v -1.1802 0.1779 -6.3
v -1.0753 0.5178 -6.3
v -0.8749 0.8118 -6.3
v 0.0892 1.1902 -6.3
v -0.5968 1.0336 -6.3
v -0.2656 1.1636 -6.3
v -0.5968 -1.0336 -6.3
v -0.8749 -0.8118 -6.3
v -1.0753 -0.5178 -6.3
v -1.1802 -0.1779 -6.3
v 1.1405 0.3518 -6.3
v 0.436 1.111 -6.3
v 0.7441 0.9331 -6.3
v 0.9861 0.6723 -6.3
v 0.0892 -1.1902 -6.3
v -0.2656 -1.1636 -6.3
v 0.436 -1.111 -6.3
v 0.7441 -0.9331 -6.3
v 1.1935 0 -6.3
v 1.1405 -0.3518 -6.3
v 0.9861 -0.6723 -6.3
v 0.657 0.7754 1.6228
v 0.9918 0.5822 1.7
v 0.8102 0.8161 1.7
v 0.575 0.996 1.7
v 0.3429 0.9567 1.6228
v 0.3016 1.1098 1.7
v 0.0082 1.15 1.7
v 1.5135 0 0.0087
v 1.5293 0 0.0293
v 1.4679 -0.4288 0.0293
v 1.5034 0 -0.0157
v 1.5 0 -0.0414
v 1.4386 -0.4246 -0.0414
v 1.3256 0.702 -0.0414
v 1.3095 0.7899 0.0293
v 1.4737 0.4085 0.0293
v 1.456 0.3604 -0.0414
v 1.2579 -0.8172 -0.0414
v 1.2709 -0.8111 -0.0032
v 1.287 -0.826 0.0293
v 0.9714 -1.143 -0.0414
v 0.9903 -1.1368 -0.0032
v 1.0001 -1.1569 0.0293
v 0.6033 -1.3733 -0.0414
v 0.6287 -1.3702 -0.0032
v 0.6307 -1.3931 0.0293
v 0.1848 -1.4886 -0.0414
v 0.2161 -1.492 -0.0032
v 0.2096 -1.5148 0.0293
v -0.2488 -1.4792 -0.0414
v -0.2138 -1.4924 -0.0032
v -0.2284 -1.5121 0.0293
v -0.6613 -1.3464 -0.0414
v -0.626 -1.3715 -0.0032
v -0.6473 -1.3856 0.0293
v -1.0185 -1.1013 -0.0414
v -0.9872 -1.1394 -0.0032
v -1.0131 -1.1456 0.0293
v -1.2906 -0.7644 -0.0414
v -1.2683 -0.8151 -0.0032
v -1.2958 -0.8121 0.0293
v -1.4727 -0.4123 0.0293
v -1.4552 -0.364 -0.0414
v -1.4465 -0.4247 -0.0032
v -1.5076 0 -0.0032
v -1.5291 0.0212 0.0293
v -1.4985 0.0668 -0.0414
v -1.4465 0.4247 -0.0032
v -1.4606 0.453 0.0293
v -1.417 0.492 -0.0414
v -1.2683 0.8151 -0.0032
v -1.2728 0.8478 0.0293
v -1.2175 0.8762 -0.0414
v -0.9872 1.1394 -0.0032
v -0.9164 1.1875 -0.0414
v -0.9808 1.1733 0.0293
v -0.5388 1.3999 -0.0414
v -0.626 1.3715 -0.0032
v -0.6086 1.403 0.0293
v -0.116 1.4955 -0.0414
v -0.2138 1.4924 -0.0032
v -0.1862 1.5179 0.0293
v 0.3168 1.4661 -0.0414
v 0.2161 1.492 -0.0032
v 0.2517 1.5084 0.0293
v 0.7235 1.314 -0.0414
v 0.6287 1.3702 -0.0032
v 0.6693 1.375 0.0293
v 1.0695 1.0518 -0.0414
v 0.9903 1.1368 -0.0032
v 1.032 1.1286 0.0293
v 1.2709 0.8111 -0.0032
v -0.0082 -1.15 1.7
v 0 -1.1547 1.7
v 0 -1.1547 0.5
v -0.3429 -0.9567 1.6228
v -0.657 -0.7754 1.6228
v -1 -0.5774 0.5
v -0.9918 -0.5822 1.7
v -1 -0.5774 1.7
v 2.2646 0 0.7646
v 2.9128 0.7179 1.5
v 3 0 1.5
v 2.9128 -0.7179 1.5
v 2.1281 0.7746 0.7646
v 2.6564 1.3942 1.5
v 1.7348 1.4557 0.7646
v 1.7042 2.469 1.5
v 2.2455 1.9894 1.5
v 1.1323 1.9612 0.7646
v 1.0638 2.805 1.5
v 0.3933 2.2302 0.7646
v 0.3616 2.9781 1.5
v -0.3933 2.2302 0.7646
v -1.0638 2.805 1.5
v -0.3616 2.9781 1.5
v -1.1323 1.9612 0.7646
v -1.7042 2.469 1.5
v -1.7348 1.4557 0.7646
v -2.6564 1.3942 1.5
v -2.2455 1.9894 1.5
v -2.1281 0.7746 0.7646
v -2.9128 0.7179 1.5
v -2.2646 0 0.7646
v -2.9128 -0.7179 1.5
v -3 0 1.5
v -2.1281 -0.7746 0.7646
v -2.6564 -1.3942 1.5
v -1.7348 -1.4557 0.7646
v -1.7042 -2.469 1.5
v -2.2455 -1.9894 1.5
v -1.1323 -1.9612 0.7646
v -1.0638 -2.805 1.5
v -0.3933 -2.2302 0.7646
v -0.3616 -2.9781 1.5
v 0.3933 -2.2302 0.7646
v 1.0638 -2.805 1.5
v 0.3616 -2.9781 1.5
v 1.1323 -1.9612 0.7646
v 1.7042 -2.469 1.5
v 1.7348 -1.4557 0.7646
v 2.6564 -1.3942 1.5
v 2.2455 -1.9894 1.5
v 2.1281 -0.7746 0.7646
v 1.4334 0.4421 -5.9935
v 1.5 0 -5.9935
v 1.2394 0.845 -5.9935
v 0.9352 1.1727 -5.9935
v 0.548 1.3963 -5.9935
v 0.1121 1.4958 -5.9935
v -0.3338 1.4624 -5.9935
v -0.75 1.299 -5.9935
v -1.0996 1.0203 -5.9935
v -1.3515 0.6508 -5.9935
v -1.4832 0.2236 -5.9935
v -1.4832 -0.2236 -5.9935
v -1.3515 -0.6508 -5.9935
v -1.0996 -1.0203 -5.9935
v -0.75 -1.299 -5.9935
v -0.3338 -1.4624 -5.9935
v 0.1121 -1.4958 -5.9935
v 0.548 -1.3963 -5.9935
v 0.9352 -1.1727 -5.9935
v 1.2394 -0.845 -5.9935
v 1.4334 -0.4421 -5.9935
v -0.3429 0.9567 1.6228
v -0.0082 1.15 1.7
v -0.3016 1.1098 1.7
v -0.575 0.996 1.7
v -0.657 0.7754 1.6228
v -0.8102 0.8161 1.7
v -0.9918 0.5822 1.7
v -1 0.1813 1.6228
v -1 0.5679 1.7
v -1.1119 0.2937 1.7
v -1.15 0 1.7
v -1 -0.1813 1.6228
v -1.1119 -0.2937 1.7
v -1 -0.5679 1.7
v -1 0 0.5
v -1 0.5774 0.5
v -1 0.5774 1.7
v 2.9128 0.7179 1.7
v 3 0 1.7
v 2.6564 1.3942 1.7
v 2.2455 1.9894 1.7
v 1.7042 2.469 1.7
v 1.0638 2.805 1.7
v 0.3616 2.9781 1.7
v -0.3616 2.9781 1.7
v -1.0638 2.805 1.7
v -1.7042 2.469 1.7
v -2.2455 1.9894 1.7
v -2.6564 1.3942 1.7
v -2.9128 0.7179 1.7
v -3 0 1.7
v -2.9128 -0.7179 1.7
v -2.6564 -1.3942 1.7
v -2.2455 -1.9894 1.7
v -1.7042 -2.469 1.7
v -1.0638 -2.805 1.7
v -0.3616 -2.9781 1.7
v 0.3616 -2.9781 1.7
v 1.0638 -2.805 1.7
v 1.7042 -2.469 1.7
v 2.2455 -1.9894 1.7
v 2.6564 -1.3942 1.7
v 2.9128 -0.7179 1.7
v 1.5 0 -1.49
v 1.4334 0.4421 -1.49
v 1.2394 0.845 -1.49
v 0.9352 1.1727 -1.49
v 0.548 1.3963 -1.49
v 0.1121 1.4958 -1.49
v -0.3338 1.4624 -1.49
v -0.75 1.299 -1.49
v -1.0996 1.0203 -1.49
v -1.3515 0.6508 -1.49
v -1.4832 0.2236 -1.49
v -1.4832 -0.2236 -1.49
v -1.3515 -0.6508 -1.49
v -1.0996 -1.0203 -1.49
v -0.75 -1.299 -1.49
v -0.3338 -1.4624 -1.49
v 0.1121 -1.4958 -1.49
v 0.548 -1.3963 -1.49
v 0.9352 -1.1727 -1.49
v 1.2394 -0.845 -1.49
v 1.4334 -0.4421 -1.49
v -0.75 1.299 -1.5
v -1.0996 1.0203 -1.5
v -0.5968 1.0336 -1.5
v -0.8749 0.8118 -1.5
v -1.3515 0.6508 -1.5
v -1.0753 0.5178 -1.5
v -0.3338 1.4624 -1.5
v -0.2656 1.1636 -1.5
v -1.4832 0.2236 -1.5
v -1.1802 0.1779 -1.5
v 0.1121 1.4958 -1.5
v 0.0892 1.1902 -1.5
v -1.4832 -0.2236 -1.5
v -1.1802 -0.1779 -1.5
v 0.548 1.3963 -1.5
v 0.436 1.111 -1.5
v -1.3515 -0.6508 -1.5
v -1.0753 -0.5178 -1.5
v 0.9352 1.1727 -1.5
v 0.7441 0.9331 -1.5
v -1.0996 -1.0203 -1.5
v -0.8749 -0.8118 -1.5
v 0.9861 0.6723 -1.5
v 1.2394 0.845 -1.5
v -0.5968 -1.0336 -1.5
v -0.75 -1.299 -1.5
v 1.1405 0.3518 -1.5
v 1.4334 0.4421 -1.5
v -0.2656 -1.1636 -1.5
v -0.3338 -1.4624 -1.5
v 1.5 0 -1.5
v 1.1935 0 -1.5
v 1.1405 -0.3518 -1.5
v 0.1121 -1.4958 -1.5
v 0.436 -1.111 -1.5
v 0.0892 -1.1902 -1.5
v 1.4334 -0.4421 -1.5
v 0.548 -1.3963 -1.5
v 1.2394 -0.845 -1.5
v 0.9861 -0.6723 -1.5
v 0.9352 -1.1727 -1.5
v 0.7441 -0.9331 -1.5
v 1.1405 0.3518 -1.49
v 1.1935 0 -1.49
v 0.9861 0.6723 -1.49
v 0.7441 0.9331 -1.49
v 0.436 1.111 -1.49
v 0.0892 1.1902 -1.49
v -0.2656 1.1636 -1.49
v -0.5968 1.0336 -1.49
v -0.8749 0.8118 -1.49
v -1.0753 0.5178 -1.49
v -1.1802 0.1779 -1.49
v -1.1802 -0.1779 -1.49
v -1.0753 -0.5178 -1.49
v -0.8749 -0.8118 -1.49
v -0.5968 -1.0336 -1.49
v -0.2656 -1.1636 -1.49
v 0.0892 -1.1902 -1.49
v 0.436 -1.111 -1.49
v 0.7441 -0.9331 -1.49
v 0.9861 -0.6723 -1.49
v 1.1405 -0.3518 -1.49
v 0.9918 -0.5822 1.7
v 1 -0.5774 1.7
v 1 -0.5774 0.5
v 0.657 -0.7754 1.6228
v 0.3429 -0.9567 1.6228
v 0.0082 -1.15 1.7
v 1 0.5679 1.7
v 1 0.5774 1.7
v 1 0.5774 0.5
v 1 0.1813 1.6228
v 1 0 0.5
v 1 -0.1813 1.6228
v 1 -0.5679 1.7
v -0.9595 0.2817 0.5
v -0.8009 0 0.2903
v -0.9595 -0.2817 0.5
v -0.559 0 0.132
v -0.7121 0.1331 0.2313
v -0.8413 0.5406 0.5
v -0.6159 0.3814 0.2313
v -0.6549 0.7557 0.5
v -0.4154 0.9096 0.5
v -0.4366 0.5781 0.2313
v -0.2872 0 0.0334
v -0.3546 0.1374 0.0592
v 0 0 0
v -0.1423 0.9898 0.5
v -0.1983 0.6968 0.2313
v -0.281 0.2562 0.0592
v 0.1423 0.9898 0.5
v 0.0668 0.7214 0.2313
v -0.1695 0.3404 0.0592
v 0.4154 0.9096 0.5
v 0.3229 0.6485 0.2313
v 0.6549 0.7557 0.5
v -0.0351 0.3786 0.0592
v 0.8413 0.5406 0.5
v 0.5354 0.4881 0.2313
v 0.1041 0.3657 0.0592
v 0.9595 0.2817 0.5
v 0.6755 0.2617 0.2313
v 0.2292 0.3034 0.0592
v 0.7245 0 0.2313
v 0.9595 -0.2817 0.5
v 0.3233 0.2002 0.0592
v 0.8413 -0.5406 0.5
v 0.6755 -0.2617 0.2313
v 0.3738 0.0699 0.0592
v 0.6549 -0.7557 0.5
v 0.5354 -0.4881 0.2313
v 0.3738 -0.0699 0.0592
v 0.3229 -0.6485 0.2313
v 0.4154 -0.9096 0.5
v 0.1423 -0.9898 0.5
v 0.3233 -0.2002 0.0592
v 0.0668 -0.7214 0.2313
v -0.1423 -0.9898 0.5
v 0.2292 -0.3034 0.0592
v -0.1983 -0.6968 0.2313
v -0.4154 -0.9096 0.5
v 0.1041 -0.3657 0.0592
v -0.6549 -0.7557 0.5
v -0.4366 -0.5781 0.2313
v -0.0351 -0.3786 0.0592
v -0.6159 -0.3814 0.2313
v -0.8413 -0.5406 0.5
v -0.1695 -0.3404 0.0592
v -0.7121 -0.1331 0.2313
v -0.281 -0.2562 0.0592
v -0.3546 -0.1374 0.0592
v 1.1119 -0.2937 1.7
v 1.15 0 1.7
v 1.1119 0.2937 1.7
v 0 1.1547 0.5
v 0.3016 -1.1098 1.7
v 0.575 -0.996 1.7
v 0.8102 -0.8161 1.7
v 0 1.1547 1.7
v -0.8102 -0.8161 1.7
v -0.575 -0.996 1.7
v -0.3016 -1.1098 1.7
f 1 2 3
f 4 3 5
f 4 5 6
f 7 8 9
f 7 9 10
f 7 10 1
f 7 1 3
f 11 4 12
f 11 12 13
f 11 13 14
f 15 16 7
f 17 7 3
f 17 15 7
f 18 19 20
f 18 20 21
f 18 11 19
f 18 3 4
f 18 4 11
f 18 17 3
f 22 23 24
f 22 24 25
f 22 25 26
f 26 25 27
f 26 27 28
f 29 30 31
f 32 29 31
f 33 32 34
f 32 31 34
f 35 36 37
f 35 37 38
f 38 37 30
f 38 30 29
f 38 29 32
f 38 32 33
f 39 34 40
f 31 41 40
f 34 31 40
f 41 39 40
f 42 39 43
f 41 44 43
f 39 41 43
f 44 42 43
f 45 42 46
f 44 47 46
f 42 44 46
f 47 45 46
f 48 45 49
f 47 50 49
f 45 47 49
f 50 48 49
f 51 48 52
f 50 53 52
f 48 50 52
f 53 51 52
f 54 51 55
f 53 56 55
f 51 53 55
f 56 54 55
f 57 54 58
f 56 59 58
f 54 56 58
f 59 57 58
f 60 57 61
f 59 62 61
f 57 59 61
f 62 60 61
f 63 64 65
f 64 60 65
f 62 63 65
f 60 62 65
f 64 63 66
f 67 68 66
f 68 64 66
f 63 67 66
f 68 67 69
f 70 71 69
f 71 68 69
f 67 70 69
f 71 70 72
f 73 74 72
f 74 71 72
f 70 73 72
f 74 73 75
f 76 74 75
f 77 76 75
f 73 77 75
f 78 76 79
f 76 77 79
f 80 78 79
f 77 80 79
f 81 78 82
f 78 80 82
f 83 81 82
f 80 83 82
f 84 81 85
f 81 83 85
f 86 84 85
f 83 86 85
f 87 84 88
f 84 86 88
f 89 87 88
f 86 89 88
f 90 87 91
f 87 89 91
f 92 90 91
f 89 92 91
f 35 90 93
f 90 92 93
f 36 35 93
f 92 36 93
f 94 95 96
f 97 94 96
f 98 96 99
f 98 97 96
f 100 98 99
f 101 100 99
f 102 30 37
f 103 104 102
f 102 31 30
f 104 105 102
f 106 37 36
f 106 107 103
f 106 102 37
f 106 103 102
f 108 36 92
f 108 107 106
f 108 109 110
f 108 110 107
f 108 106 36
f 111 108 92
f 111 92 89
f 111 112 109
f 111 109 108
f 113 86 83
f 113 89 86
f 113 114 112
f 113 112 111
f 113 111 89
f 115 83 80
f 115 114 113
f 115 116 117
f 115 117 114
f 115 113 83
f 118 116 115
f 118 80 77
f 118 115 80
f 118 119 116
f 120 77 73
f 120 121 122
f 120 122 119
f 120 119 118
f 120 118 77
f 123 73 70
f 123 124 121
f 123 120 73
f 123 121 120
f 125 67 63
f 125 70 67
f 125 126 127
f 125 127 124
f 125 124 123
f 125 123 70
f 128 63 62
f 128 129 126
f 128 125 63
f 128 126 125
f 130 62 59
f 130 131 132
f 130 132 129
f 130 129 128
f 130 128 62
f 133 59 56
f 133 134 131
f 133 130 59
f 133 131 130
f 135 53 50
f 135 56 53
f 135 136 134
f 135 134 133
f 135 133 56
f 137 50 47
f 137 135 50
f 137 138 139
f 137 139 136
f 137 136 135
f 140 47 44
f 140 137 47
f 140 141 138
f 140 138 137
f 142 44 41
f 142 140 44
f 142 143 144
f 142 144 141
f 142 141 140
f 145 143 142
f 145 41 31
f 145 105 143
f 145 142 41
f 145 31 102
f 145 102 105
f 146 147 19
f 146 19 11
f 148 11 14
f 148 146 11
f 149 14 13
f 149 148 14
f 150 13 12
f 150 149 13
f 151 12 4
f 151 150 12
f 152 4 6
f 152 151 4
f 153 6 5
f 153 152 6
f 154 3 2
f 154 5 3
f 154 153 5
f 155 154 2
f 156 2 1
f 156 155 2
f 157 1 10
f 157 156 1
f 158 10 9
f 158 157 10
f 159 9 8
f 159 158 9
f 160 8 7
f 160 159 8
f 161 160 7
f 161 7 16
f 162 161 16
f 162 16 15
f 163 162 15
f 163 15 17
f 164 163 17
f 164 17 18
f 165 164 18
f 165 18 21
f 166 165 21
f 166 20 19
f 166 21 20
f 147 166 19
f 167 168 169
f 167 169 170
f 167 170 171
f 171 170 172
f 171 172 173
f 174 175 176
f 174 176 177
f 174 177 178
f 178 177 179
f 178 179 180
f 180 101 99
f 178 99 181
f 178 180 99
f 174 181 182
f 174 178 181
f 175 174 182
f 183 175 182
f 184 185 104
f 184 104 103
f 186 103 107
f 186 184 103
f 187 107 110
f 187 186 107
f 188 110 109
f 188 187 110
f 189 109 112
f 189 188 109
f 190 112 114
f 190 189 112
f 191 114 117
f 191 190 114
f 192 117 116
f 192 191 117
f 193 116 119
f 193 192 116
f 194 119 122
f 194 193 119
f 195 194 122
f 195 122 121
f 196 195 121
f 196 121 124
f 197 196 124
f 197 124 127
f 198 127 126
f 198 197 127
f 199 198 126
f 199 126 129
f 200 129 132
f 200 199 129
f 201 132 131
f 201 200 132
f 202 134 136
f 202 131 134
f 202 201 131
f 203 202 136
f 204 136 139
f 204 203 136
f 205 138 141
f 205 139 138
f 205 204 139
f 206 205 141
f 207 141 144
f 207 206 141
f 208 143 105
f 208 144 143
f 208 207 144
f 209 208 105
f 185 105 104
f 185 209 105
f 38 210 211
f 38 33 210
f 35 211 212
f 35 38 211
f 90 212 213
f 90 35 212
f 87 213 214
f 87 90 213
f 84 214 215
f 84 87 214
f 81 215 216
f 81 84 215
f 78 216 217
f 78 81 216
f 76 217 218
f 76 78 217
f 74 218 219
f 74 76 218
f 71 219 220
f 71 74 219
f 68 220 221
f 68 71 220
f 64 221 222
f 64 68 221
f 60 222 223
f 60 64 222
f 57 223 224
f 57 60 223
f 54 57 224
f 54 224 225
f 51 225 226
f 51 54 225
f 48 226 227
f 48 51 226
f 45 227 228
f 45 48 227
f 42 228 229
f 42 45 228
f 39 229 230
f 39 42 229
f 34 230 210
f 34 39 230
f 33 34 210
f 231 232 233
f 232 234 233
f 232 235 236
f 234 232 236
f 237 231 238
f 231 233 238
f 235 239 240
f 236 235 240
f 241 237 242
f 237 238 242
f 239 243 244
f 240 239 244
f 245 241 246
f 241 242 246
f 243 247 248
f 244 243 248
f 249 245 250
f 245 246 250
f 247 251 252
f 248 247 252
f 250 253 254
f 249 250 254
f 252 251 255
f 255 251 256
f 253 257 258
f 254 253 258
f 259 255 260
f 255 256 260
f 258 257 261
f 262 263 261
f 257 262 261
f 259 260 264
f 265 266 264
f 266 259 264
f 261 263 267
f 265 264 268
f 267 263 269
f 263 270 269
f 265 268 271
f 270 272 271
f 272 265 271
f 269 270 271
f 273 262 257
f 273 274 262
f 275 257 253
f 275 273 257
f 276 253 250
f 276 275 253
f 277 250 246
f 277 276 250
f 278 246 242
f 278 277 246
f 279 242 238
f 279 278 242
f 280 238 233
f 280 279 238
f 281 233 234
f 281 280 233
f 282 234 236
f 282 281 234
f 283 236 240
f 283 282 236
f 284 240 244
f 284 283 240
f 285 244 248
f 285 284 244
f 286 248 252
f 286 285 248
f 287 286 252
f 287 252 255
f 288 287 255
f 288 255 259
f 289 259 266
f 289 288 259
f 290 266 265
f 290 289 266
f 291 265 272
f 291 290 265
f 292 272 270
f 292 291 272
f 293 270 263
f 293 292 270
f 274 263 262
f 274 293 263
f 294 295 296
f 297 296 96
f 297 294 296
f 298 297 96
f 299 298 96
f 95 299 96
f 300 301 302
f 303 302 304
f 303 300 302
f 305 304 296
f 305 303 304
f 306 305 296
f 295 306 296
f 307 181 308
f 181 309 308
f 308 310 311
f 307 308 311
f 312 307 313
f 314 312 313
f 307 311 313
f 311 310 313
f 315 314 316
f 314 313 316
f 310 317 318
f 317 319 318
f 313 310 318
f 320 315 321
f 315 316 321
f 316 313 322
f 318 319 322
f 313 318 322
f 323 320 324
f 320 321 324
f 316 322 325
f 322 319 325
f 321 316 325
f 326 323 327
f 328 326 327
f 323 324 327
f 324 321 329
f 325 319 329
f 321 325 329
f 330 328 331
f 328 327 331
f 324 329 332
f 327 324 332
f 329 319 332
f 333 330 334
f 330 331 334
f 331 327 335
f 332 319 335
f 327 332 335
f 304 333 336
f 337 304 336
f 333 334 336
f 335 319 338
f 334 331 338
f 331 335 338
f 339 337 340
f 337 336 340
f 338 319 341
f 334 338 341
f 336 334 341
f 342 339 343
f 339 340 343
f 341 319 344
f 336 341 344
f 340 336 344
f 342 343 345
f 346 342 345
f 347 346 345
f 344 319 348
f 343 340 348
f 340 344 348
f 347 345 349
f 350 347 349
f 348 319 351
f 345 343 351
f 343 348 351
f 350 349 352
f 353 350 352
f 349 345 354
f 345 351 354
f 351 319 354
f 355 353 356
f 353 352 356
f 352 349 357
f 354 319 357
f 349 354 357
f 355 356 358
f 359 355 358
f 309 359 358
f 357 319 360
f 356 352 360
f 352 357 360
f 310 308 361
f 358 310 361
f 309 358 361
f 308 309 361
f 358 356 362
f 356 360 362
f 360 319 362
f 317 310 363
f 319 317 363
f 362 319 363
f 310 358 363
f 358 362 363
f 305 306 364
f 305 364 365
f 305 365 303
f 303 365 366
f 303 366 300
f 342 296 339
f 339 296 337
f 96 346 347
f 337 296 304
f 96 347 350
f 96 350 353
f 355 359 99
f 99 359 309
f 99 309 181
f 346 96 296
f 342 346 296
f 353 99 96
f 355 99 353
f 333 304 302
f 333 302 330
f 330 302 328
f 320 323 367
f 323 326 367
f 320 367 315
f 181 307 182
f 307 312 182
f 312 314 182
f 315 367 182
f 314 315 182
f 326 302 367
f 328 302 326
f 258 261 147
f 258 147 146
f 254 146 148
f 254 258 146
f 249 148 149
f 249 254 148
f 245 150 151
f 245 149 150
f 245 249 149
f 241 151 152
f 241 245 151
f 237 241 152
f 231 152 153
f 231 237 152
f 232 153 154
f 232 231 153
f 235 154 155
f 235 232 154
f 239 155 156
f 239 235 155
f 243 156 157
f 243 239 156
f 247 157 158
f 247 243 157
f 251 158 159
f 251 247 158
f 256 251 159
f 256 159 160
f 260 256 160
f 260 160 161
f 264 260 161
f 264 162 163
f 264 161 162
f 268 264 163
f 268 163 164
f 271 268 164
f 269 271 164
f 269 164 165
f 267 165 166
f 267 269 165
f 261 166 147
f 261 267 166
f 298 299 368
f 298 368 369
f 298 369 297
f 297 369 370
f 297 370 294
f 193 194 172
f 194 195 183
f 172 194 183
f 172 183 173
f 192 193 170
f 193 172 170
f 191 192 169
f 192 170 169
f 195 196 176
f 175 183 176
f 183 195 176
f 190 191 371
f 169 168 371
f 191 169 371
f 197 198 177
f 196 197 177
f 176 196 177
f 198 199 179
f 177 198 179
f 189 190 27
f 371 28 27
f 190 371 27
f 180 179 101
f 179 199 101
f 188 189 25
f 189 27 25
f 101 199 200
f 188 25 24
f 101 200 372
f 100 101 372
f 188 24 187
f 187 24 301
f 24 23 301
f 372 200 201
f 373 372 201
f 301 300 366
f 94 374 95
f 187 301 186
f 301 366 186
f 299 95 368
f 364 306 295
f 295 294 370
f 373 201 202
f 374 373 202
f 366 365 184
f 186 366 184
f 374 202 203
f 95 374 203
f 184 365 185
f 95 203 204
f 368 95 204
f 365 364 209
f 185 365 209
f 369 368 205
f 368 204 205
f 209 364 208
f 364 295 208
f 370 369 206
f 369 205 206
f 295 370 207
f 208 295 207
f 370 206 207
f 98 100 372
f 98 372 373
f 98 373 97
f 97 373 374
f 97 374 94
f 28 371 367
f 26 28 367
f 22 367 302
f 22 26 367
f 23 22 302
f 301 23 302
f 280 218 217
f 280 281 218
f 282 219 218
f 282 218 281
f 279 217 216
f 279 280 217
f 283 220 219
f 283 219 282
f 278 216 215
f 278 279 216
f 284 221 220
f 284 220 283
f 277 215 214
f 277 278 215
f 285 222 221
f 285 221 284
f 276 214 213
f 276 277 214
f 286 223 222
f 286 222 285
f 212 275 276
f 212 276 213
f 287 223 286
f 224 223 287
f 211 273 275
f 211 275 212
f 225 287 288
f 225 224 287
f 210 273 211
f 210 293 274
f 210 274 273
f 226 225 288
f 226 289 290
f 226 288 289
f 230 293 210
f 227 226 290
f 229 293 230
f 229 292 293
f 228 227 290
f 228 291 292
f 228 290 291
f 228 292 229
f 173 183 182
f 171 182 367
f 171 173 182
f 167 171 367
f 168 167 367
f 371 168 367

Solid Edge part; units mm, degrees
sketch "Sketch1" plane through (0, 0, 0) normal (0, -1, 0) x (1, 0, 0)
  line L0 (1.5, 0) -> (3, 1.5)
  line L1 (3, 1.5) -> (3, 1.7)
  line L2 (3, 1.7) -> (0, 1.7)
  line L3 (0, 1.7) -> (0, -6.3)
  line L4 (0, -6.3) -> (1.1935, -6.3)
  line L5 (1.1935, -6.3) -> (1.5, -5.9935)
  line L6 (1.5, -5.9935) -> (1.5, -1.5)
  line L7 (1.5, -1.5) -> (1.1935, -1.5)
  line L8 (1.1935, -1.5) -> (1.1935, -1.49)
  line L9 (1.1935, -1.49) -> (1.5, -1.49)
  line L10 (1.5, -1.49) -> (1.5, 0)
  dimension "D1" = 8
  dimension "D2" = 3
  dimension "D3" = 1.7
  dimension "D4" = 0.01
  dimension "D5" = 1.1935
  dimension "D6" = 3.2
  dimension "D7" = 0.2
revolve "RevolvedProtrusion1" add sketch "Sketch1" angle 360 about axis through (0, 0, 54) along (0, 0, -1)
sketch "Sketch2" plane through (0, 0, 0) normal (0, -1, 0) x (1, 0, 0)
  arc A0 (-1, 0.5) -> (0, 0) centre (0, 1.25) ccw
  line L0 (0, 0.5) -> (0, 0)
  line L1 (-1, 0.5) -> (0, 0.5)
  dimension "D1" = 6.8
revolve "RevolvedCutout1" cut sketch "Sketch2" angle 360 about axis through (0, 0, 54) along (0, 0, -1)
sketch "Sketch3" plane through (0, 0, 1.7) normal (0, 0, 1) x (0, -1, 0)
  line L0 (-1.1547, 0) -> (-0.5774, 1)
  line L1 (-0.5774, 1) -> (0.5774, 1)
  line L2 (0.5774, 1) -> (1.1547, 0)
  line L3 (1.1547, 0) -> (0.5774, -1)
  line L4 (0.5774, -1) -> (-0.5774, -1)
  line L5 (-0.5774, -1) -> (-1.1547, 0)
  dimension "D1" = 2
extrude "Cutout1" cut sketch "Sketch3" against normal blind 1.2
cosmetic_thread "Thread1" size "M3"
sketch "Sketch4" plane through (0, 0, 0) normal (1, 0, 0) x (0, 1, 0)
  line L0 (-1.15, 1.7) -> (0, 1.036)
revolve "RevolvedCutout2" cut sketch "Sketch4" angle 360 about axis through (0, 0, -57) along (0, 0, 1) material side at (0, -0.55, 1.4113)
fillet "Round1" radius 0.1 1 edges at (-1.5, 0, 0)
properties material "Stahl"
